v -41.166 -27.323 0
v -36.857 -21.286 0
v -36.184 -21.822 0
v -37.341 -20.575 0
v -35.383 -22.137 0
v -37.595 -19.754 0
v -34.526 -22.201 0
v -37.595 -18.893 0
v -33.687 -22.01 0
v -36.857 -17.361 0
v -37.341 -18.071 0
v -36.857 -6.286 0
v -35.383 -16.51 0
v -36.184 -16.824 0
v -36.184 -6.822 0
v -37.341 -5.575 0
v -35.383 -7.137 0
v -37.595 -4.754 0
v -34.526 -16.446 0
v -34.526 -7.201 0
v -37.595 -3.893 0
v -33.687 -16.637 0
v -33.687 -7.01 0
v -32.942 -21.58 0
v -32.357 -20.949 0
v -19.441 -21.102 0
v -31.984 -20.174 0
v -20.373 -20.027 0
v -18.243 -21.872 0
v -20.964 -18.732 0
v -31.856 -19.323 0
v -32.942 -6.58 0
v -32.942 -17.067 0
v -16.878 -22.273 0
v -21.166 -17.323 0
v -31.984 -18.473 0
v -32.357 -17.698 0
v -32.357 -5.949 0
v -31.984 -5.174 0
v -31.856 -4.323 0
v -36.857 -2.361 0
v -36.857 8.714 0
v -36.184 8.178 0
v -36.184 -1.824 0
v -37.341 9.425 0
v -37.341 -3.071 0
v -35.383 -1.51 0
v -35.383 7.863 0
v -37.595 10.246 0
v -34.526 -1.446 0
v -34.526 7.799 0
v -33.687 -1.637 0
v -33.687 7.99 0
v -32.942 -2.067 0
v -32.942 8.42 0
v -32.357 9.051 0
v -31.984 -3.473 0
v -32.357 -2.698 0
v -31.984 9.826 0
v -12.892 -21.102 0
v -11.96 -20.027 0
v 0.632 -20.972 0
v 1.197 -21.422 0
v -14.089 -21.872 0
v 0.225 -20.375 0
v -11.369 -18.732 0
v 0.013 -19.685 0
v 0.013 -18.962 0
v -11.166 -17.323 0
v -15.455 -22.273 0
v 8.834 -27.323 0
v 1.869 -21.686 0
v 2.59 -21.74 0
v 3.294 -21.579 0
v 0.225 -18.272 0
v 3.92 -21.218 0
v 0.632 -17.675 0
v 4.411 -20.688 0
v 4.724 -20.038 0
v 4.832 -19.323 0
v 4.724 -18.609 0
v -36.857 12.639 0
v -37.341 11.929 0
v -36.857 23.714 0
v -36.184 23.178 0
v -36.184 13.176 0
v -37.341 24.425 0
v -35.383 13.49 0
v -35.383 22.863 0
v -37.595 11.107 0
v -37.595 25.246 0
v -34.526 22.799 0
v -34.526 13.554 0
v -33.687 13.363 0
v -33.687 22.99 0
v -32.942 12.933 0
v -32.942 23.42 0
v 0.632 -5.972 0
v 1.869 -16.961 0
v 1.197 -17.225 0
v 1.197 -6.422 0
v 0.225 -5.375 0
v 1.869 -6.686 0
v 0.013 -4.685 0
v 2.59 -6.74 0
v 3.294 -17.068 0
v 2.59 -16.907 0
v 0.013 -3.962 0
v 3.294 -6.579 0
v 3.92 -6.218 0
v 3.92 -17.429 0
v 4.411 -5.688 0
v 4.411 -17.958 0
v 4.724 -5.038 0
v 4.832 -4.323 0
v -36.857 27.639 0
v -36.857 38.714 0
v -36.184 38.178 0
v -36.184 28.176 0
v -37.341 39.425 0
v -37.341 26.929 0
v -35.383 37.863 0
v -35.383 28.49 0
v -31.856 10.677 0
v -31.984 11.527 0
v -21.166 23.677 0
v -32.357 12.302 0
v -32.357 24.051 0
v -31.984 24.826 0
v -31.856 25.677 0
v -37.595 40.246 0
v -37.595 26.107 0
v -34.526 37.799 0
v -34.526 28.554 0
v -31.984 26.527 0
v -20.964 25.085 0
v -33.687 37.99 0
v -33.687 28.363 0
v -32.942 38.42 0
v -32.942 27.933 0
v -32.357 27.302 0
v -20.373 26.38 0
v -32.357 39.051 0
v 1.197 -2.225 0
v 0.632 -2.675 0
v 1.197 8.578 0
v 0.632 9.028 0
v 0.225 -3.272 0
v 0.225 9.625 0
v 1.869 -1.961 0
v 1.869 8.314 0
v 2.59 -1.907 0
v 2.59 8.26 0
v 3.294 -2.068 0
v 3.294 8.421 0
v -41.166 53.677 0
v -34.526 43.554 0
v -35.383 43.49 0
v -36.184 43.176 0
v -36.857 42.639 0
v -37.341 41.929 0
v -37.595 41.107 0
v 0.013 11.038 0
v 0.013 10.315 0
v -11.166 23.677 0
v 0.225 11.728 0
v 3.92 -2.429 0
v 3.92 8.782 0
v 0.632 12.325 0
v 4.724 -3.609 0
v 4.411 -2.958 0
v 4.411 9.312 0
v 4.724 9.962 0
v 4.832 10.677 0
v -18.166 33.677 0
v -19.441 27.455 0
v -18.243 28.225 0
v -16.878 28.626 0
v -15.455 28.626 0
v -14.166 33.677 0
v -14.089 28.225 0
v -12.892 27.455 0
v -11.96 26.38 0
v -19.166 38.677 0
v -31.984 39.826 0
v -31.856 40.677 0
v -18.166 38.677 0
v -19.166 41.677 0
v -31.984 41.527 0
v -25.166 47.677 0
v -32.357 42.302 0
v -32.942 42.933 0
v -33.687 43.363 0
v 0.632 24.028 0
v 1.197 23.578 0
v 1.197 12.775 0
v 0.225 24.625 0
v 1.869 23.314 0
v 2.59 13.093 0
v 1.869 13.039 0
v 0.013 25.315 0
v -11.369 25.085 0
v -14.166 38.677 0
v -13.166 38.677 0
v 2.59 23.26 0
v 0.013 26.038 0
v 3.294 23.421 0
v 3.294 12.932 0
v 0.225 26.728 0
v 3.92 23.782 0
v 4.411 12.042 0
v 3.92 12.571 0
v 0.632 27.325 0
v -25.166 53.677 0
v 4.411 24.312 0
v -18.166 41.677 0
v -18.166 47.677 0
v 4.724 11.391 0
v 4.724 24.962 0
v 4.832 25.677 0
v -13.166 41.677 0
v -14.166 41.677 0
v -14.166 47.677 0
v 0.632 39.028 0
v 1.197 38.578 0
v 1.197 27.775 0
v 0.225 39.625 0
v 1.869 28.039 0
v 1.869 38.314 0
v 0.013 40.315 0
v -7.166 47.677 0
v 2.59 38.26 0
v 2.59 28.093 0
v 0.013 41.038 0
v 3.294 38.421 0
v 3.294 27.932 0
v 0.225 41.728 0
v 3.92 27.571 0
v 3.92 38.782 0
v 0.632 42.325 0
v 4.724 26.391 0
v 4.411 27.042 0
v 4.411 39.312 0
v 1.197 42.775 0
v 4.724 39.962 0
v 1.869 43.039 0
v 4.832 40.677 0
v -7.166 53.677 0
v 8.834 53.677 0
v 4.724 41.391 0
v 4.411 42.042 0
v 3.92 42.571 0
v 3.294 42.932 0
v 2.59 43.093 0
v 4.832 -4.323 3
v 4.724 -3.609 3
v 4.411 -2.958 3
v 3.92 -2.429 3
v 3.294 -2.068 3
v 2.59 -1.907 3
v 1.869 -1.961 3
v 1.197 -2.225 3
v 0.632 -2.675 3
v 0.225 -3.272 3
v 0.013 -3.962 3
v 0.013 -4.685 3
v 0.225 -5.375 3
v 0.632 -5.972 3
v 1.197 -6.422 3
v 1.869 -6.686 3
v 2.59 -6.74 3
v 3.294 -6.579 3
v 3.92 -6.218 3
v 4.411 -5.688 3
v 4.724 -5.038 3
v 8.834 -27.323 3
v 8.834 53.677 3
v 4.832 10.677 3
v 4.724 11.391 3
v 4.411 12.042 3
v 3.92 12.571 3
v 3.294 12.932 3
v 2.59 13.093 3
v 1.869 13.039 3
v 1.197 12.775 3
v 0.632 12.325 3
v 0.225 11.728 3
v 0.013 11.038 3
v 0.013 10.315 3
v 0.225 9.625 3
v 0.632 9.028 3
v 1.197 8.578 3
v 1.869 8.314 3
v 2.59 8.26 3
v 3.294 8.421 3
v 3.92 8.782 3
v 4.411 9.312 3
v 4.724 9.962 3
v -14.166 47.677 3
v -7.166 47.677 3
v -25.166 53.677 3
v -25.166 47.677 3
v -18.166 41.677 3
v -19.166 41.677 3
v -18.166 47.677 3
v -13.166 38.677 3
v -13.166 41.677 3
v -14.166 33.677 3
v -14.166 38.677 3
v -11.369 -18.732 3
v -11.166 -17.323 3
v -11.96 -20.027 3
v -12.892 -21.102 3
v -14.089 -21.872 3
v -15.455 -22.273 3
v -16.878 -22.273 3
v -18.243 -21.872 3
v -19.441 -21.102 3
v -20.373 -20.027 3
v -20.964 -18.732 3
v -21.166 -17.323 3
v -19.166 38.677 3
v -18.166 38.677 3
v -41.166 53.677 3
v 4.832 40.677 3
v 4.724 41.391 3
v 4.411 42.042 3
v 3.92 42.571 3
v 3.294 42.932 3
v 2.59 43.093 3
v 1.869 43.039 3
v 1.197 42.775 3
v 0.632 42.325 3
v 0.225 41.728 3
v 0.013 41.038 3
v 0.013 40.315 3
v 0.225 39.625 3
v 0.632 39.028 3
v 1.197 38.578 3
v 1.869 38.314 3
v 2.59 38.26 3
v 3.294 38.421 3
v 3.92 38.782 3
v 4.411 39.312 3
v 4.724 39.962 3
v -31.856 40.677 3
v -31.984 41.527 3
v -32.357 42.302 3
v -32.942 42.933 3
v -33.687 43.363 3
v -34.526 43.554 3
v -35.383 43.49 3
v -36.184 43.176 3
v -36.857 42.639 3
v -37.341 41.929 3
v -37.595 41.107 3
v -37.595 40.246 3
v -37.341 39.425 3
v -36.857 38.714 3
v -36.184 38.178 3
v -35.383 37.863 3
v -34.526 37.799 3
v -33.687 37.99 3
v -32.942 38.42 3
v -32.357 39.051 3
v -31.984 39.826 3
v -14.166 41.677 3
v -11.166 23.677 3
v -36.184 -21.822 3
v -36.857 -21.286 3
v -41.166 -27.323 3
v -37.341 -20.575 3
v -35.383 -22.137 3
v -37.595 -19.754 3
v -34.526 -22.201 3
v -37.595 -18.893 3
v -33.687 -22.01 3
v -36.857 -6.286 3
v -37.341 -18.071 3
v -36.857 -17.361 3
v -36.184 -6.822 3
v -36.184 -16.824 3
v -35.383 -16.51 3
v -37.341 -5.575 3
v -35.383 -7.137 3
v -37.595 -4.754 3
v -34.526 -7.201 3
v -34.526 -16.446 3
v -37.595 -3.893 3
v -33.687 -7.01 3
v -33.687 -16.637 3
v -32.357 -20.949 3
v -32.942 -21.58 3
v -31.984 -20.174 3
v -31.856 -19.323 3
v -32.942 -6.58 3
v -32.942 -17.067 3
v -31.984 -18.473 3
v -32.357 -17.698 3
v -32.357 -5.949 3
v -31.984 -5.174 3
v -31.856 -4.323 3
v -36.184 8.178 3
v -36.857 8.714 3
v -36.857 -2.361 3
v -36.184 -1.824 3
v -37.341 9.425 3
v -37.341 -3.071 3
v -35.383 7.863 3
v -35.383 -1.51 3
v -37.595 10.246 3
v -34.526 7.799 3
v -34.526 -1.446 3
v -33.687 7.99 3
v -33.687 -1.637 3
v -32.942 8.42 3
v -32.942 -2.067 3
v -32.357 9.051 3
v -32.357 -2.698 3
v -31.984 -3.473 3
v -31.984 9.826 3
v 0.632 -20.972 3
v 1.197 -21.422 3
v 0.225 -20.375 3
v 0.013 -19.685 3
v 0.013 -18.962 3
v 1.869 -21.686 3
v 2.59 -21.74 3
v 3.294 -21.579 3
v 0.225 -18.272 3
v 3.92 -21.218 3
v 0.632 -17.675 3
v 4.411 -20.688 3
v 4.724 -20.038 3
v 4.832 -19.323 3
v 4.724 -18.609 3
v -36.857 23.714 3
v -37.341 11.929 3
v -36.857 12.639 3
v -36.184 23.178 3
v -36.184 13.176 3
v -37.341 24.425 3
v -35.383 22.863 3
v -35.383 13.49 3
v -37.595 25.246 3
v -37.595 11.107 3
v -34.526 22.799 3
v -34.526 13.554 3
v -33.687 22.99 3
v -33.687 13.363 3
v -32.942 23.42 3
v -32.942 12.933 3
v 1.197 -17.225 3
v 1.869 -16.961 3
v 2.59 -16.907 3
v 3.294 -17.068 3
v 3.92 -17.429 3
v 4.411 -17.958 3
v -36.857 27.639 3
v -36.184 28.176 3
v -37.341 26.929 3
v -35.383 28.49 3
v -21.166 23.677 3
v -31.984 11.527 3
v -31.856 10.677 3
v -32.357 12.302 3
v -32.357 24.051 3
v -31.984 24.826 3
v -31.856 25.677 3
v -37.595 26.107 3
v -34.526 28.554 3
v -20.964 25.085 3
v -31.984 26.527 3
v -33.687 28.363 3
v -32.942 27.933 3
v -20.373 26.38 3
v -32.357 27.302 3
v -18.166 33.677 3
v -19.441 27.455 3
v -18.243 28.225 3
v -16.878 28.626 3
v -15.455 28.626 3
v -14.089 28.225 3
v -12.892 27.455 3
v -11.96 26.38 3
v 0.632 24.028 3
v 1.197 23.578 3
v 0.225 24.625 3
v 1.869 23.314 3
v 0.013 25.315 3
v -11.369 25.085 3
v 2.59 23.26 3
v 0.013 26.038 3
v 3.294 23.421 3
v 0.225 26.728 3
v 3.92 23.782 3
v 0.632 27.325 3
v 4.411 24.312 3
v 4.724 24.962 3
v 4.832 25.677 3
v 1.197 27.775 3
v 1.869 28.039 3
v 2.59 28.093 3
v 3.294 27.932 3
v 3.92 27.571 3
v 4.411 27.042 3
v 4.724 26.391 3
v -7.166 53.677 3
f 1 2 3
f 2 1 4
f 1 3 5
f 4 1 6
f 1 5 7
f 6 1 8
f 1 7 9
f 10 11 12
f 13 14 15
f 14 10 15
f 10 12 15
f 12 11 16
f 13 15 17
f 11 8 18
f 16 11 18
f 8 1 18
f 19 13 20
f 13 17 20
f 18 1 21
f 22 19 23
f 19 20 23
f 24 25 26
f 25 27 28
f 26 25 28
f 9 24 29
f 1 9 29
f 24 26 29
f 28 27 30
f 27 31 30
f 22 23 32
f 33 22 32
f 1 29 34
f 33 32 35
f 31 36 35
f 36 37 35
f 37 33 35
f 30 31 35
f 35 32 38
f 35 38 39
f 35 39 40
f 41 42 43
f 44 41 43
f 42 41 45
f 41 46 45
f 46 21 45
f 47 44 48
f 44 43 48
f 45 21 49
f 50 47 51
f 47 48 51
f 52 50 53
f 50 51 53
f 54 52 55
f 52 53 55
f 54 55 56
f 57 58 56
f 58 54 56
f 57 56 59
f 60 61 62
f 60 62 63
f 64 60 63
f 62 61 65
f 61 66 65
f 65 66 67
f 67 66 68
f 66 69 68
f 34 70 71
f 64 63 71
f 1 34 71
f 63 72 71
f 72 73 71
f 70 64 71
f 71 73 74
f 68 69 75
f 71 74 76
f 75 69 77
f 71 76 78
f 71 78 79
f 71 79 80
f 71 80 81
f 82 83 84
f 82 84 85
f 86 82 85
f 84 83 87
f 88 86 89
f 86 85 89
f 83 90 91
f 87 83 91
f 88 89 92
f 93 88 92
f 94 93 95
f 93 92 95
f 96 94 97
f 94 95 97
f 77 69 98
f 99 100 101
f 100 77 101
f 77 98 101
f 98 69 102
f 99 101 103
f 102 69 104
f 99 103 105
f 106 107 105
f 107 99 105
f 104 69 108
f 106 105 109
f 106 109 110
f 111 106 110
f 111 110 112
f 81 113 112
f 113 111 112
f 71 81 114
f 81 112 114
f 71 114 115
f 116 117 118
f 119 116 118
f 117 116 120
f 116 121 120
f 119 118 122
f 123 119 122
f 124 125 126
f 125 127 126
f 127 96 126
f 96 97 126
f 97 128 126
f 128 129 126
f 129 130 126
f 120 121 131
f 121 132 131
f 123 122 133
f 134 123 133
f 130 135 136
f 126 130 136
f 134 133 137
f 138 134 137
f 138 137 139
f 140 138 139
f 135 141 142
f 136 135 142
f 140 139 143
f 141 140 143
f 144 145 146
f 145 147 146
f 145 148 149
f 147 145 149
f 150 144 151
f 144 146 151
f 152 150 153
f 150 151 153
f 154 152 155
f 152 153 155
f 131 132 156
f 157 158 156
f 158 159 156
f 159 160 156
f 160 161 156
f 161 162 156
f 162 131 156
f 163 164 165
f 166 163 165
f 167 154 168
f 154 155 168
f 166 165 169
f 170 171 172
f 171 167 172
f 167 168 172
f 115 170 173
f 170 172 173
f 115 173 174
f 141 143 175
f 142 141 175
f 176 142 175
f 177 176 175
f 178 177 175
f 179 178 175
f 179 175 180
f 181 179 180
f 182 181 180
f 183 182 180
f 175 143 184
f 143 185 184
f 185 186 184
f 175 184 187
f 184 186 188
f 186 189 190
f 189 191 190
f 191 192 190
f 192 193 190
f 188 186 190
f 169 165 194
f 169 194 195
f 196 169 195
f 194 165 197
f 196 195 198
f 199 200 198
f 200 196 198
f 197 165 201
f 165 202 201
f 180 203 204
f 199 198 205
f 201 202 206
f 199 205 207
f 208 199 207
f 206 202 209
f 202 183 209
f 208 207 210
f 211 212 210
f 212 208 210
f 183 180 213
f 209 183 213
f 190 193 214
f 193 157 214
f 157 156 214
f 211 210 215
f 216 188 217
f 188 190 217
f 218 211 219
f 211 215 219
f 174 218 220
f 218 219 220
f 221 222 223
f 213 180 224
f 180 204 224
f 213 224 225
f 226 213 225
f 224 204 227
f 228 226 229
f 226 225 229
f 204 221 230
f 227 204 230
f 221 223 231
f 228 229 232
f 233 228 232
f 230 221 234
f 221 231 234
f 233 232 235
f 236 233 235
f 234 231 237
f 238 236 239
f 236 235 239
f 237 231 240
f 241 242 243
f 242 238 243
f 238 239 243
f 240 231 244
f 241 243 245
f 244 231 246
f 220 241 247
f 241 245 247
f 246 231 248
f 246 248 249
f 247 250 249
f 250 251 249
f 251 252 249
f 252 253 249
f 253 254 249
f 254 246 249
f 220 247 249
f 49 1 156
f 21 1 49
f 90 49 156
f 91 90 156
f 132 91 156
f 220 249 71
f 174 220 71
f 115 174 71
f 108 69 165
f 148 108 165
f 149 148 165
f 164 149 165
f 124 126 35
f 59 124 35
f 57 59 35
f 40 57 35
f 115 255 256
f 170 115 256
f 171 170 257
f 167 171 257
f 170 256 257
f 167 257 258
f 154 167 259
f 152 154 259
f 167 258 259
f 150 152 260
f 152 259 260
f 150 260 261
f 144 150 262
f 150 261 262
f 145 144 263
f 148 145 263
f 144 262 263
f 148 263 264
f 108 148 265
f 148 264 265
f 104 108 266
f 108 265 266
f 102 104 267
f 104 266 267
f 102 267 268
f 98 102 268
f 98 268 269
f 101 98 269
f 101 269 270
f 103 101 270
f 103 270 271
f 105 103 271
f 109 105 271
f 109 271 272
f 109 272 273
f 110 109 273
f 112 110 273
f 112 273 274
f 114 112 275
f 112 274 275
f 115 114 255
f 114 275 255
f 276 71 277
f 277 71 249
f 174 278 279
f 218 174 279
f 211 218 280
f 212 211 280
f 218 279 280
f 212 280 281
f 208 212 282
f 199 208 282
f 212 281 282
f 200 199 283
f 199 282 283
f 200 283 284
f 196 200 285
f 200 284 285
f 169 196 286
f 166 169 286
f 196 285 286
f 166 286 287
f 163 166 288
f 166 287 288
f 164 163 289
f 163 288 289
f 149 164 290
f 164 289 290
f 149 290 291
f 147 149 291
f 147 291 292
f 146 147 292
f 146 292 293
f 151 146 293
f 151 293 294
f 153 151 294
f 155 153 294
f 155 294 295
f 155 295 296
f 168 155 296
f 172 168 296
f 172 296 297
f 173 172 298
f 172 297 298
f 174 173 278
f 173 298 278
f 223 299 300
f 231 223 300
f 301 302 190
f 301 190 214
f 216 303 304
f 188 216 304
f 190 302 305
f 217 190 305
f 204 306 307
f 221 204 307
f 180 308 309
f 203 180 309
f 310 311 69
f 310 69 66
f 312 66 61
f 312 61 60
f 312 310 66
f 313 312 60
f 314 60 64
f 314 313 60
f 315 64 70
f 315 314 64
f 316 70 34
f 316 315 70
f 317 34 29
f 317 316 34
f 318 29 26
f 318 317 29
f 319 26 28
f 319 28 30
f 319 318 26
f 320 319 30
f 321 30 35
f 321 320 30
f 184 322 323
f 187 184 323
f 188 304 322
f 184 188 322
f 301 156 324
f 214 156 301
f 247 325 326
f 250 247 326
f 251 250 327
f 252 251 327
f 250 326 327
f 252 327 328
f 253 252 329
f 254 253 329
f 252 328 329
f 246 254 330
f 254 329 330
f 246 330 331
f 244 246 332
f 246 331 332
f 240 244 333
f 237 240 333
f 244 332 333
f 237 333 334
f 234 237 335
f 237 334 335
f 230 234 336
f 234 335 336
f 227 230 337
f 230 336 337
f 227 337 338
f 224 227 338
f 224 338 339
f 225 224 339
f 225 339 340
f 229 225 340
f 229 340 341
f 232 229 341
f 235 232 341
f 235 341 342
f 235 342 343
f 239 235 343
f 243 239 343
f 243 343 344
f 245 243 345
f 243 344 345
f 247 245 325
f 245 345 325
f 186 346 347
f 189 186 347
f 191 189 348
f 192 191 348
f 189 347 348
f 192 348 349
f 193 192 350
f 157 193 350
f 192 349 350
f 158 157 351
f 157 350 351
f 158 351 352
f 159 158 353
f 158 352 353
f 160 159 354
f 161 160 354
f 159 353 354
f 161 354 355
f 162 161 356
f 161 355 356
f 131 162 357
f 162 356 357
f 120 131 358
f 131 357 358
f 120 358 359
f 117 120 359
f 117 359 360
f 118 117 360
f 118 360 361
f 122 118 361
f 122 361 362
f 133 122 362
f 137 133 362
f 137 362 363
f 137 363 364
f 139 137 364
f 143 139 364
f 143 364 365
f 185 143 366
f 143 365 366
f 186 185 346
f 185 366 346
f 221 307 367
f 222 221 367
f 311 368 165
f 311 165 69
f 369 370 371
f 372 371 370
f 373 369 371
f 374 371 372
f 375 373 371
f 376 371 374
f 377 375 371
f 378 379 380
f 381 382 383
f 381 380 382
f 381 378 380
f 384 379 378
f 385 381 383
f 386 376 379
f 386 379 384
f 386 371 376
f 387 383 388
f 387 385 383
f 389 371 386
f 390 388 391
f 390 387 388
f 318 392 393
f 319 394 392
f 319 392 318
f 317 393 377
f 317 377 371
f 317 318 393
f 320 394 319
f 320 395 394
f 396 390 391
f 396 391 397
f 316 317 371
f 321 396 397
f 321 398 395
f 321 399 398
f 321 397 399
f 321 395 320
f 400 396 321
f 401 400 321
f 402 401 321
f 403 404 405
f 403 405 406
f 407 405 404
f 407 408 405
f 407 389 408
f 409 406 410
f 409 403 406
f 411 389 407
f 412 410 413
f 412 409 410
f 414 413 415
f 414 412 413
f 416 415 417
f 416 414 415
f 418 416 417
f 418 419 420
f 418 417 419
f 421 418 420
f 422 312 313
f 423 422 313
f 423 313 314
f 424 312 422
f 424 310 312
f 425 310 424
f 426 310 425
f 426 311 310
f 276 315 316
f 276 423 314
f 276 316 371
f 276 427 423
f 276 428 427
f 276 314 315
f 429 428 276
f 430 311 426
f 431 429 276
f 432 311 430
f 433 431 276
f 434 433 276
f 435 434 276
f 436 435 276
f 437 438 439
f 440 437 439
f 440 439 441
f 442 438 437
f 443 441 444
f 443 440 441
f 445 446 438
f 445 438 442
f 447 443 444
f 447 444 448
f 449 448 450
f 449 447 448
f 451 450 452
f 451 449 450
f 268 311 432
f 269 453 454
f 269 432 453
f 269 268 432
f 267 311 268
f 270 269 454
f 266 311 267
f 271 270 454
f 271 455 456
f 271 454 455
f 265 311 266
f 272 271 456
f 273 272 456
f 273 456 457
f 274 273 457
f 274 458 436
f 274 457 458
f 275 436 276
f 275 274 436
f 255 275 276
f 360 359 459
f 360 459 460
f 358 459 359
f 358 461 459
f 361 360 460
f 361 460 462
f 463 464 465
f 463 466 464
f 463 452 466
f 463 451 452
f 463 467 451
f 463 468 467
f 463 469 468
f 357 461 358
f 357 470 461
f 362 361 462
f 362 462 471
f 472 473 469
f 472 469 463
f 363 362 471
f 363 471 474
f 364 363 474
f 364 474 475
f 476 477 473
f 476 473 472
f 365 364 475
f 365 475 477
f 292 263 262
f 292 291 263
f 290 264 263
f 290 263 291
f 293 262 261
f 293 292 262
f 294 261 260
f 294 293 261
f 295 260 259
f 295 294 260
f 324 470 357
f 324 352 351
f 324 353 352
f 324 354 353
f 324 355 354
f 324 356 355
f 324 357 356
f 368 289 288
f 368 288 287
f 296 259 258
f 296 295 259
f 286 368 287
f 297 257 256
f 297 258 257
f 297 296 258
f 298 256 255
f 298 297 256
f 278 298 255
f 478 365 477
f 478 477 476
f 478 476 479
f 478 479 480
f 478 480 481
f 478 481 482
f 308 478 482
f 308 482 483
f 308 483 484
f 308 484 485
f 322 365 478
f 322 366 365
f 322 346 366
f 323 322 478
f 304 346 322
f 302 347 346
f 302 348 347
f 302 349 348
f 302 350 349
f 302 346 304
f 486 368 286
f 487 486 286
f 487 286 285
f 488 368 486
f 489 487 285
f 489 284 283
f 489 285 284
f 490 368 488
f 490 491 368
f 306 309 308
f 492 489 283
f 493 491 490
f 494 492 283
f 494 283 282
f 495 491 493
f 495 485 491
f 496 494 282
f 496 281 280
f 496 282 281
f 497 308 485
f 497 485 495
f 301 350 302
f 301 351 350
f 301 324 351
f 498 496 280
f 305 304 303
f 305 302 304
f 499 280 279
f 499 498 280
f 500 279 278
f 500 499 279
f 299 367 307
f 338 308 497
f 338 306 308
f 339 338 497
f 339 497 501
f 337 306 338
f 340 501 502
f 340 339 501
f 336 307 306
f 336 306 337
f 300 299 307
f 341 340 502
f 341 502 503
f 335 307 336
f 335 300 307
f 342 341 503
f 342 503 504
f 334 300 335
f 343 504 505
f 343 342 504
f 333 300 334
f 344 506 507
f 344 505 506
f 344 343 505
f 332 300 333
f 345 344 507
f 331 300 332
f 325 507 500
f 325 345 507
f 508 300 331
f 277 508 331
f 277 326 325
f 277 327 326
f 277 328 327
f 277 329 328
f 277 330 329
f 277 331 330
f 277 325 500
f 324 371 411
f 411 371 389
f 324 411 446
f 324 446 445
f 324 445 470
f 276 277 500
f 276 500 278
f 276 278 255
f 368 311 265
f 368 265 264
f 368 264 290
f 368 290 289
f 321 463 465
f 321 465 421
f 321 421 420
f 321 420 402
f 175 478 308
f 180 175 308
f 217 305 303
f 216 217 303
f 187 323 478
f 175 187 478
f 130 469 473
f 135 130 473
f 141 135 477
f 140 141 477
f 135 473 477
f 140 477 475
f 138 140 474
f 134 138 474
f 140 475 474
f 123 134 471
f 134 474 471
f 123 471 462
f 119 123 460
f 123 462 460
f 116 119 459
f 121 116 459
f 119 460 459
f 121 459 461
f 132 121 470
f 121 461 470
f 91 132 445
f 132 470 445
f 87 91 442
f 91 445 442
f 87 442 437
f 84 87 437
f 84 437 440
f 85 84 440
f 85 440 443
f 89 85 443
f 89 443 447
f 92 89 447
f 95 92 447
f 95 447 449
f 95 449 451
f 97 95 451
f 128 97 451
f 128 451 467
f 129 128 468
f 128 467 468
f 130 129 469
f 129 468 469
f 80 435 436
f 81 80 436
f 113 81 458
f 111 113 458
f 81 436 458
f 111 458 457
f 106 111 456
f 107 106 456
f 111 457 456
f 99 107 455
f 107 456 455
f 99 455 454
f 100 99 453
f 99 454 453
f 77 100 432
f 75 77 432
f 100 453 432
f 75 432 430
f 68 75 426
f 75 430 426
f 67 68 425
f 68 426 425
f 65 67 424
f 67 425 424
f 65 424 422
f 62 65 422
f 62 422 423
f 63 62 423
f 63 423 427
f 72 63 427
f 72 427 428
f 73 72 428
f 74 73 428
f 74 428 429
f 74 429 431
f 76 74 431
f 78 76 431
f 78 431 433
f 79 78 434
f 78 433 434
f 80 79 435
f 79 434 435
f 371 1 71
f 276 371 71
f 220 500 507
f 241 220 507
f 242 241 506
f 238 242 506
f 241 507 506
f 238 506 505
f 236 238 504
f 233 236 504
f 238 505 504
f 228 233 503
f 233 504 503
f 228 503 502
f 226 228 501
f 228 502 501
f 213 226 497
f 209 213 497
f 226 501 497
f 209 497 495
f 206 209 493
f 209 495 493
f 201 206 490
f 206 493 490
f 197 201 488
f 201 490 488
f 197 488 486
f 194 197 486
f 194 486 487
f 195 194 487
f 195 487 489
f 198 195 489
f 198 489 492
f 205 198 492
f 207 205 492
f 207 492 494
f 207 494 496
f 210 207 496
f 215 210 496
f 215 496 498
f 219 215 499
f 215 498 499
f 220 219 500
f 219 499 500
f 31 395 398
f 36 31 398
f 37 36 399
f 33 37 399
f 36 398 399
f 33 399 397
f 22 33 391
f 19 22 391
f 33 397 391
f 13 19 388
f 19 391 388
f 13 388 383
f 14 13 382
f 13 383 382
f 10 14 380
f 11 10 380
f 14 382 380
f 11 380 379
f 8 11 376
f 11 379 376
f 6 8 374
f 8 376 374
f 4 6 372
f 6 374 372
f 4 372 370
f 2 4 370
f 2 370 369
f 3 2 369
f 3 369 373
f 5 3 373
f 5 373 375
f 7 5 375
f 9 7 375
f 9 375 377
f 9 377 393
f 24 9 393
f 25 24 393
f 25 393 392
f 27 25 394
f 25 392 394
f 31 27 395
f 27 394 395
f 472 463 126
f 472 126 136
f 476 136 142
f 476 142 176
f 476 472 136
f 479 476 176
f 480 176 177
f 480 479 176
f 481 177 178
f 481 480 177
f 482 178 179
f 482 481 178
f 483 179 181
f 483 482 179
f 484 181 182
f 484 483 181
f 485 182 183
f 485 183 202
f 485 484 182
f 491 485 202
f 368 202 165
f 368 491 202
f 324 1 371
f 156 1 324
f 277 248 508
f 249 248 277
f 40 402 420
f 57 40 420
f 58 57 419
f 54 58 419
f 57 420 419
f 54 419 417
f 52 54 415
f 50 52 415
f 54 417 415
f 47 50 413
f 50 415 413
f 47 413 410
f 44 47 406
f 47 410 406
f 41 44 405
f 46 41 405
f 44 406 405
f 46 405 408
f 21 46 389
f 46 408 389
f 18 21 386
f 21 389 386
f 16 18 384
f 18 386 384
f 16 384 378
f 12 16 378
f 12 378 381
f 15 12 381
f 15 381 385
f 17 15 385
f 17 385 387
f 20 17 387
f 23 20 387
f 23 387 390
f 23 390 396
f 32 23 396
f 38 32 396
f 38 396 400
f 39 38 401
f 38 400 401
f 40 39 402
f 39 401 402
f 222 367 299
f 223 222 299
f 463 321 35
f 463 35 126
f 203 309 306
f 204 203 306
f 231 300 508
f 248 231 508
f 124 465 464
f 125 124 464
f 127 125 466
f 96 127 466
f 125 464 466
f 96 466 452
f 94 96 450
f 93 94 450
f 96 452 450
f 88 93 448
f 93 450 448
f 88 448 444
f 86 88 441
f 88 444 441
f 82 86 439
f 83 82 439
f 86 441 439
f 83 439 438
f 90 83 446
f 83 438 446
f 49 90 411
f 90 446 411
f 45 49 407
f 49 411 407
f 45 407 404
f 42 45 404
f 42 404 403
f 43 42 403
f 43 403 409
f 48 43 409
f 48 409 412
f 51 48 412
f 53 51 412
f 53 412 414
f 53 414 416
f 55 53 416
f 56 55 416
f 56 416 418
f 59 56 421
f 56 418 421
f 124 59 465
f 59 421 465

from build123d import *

# Parameters (mm, degrees)
ESQUISSE1_W             = 50
ESQUISSE1_H             = 81
BOSS_EXTRU_1_DEPTH      = 3
ESQUISSE2_W             = 18
ESQUISSE2_H             = 6
ENL_V_MAT_EXTRU_1_DEPTH = 3
ENL_V_MAT_EXTRU_2_DEPTH = 3
ESQUISSE5_R             = 2.885610726
ESQUISSE5_R_2           = 2.423229835
ENL_V_MAT_EXTRU_3_DEPTH = 3


with BuildPart() as part:
    # Esquisse1 → Boss.-Extru.1 (new body)
    with BuildSketch(Plane.XY):
        with Locations((-16.166294243, 13.176556017)):
            Rectangle(ESQUISSE1_W, ESQUISSE1_H)
    extrude(amount=BOSS_EXTRU_1_DEPTH)

    # Esquisse2 → Enlèv. mat.-Extru.1 (cut)
    with BuildSketch(Plane.XY.offset(3)):
        with Locations((-16.166294243, 50.676556017)):
            Rectangle(ESQUISSE2_W, ESQUISSE2_H)
    extrude(amount=-ENL_V_MAT_EXTRU_1_DEPTH, mode=Mode.SUBTRACT)

    # Esquisse3 → Enlèv. mat.-Extru.2 (cut)
    with BuildSketch(Plane.XY.offset(3)):
        Polygon((-18.166294243, 41.676556017), (-19.166294243, 41.676556017), (-19.166294243, 38.676556017), (-18.166294243, 38.676556017), (-18.166294243, 33.676556017), (-14.166294243, 33.676556017), (-14.166294243, 38.676556017), (-13.166294243, 38.676556017), (-13.166294243, 41.676556017), (-14.166294243, 41.676556017), (-14.166294243, 47.676556017), (-18.166294243, 47.676556017), align=None)
        with BuildLine():
            Line((-11.166294243, 23.676556017), (-11.166294243, -17.323443983))
            ThreePointArc((-11.166294243, -17.323443983), (-16.166294243, -22.323443983), (-21.166294243, -17.323443983))
            Line((-21.166294243, -17.323443983), (-21.166294243, 23.676556017))
            ThreePointArc((-21.166294243, 23.676556017), (-16.166294243, 28.676556017), (-11.166294243, 23.676556017))
        make_face()
    extrude(amount=-ENL_V_MAT_EXTRU_2_DEPTH, mode=Mode.SUBTRACT)

    # Esquisse5 → Enlèv. mat.-Extru.3 (cut)
    with BuildSketch(Plane.XY.offset(3)):
        with Locations((-34.741294243, -19.323443983)):
            Circle(ESQUISSE5_R)
        with Locations((2.408705757, -19.323443983)):
            Circle(ESQUISSE5_R_2)
        with Locations((-34.741294243, -4.323443983)):
            Circle(ESQUISSE5_R)
        with Locations((2.408705757, -4.323443983)):
            Circle(ESQUISSE5_R_2)
        with Locations((-34.741294243, 10.676556017)):
            Circle(ESQUISSE5_R)
        with Locations((2.408705757, 10.676556017)):
            Circle(ESQUISSE5_R_2)
        with Locations((-34.741294243, 25.676556017)):
            Circle(ESQUISSE5_R)
        with Locations((2.408705757, 25.676556017)):
            Circle(ESQUISSE5_R_2)
        with Locations((-34.741294243, 40.676556017)):
            Circle(ESQUISSE5_R)
        with Locations((2.408705757, 40.676556017)):
            Circle(ESQUISSE5_R_2)
    extrude(amount=-ENL_V_MAT_EXTRU_3_DEPTH, mode=Mode.SUBTRACT)


solid = part.part
